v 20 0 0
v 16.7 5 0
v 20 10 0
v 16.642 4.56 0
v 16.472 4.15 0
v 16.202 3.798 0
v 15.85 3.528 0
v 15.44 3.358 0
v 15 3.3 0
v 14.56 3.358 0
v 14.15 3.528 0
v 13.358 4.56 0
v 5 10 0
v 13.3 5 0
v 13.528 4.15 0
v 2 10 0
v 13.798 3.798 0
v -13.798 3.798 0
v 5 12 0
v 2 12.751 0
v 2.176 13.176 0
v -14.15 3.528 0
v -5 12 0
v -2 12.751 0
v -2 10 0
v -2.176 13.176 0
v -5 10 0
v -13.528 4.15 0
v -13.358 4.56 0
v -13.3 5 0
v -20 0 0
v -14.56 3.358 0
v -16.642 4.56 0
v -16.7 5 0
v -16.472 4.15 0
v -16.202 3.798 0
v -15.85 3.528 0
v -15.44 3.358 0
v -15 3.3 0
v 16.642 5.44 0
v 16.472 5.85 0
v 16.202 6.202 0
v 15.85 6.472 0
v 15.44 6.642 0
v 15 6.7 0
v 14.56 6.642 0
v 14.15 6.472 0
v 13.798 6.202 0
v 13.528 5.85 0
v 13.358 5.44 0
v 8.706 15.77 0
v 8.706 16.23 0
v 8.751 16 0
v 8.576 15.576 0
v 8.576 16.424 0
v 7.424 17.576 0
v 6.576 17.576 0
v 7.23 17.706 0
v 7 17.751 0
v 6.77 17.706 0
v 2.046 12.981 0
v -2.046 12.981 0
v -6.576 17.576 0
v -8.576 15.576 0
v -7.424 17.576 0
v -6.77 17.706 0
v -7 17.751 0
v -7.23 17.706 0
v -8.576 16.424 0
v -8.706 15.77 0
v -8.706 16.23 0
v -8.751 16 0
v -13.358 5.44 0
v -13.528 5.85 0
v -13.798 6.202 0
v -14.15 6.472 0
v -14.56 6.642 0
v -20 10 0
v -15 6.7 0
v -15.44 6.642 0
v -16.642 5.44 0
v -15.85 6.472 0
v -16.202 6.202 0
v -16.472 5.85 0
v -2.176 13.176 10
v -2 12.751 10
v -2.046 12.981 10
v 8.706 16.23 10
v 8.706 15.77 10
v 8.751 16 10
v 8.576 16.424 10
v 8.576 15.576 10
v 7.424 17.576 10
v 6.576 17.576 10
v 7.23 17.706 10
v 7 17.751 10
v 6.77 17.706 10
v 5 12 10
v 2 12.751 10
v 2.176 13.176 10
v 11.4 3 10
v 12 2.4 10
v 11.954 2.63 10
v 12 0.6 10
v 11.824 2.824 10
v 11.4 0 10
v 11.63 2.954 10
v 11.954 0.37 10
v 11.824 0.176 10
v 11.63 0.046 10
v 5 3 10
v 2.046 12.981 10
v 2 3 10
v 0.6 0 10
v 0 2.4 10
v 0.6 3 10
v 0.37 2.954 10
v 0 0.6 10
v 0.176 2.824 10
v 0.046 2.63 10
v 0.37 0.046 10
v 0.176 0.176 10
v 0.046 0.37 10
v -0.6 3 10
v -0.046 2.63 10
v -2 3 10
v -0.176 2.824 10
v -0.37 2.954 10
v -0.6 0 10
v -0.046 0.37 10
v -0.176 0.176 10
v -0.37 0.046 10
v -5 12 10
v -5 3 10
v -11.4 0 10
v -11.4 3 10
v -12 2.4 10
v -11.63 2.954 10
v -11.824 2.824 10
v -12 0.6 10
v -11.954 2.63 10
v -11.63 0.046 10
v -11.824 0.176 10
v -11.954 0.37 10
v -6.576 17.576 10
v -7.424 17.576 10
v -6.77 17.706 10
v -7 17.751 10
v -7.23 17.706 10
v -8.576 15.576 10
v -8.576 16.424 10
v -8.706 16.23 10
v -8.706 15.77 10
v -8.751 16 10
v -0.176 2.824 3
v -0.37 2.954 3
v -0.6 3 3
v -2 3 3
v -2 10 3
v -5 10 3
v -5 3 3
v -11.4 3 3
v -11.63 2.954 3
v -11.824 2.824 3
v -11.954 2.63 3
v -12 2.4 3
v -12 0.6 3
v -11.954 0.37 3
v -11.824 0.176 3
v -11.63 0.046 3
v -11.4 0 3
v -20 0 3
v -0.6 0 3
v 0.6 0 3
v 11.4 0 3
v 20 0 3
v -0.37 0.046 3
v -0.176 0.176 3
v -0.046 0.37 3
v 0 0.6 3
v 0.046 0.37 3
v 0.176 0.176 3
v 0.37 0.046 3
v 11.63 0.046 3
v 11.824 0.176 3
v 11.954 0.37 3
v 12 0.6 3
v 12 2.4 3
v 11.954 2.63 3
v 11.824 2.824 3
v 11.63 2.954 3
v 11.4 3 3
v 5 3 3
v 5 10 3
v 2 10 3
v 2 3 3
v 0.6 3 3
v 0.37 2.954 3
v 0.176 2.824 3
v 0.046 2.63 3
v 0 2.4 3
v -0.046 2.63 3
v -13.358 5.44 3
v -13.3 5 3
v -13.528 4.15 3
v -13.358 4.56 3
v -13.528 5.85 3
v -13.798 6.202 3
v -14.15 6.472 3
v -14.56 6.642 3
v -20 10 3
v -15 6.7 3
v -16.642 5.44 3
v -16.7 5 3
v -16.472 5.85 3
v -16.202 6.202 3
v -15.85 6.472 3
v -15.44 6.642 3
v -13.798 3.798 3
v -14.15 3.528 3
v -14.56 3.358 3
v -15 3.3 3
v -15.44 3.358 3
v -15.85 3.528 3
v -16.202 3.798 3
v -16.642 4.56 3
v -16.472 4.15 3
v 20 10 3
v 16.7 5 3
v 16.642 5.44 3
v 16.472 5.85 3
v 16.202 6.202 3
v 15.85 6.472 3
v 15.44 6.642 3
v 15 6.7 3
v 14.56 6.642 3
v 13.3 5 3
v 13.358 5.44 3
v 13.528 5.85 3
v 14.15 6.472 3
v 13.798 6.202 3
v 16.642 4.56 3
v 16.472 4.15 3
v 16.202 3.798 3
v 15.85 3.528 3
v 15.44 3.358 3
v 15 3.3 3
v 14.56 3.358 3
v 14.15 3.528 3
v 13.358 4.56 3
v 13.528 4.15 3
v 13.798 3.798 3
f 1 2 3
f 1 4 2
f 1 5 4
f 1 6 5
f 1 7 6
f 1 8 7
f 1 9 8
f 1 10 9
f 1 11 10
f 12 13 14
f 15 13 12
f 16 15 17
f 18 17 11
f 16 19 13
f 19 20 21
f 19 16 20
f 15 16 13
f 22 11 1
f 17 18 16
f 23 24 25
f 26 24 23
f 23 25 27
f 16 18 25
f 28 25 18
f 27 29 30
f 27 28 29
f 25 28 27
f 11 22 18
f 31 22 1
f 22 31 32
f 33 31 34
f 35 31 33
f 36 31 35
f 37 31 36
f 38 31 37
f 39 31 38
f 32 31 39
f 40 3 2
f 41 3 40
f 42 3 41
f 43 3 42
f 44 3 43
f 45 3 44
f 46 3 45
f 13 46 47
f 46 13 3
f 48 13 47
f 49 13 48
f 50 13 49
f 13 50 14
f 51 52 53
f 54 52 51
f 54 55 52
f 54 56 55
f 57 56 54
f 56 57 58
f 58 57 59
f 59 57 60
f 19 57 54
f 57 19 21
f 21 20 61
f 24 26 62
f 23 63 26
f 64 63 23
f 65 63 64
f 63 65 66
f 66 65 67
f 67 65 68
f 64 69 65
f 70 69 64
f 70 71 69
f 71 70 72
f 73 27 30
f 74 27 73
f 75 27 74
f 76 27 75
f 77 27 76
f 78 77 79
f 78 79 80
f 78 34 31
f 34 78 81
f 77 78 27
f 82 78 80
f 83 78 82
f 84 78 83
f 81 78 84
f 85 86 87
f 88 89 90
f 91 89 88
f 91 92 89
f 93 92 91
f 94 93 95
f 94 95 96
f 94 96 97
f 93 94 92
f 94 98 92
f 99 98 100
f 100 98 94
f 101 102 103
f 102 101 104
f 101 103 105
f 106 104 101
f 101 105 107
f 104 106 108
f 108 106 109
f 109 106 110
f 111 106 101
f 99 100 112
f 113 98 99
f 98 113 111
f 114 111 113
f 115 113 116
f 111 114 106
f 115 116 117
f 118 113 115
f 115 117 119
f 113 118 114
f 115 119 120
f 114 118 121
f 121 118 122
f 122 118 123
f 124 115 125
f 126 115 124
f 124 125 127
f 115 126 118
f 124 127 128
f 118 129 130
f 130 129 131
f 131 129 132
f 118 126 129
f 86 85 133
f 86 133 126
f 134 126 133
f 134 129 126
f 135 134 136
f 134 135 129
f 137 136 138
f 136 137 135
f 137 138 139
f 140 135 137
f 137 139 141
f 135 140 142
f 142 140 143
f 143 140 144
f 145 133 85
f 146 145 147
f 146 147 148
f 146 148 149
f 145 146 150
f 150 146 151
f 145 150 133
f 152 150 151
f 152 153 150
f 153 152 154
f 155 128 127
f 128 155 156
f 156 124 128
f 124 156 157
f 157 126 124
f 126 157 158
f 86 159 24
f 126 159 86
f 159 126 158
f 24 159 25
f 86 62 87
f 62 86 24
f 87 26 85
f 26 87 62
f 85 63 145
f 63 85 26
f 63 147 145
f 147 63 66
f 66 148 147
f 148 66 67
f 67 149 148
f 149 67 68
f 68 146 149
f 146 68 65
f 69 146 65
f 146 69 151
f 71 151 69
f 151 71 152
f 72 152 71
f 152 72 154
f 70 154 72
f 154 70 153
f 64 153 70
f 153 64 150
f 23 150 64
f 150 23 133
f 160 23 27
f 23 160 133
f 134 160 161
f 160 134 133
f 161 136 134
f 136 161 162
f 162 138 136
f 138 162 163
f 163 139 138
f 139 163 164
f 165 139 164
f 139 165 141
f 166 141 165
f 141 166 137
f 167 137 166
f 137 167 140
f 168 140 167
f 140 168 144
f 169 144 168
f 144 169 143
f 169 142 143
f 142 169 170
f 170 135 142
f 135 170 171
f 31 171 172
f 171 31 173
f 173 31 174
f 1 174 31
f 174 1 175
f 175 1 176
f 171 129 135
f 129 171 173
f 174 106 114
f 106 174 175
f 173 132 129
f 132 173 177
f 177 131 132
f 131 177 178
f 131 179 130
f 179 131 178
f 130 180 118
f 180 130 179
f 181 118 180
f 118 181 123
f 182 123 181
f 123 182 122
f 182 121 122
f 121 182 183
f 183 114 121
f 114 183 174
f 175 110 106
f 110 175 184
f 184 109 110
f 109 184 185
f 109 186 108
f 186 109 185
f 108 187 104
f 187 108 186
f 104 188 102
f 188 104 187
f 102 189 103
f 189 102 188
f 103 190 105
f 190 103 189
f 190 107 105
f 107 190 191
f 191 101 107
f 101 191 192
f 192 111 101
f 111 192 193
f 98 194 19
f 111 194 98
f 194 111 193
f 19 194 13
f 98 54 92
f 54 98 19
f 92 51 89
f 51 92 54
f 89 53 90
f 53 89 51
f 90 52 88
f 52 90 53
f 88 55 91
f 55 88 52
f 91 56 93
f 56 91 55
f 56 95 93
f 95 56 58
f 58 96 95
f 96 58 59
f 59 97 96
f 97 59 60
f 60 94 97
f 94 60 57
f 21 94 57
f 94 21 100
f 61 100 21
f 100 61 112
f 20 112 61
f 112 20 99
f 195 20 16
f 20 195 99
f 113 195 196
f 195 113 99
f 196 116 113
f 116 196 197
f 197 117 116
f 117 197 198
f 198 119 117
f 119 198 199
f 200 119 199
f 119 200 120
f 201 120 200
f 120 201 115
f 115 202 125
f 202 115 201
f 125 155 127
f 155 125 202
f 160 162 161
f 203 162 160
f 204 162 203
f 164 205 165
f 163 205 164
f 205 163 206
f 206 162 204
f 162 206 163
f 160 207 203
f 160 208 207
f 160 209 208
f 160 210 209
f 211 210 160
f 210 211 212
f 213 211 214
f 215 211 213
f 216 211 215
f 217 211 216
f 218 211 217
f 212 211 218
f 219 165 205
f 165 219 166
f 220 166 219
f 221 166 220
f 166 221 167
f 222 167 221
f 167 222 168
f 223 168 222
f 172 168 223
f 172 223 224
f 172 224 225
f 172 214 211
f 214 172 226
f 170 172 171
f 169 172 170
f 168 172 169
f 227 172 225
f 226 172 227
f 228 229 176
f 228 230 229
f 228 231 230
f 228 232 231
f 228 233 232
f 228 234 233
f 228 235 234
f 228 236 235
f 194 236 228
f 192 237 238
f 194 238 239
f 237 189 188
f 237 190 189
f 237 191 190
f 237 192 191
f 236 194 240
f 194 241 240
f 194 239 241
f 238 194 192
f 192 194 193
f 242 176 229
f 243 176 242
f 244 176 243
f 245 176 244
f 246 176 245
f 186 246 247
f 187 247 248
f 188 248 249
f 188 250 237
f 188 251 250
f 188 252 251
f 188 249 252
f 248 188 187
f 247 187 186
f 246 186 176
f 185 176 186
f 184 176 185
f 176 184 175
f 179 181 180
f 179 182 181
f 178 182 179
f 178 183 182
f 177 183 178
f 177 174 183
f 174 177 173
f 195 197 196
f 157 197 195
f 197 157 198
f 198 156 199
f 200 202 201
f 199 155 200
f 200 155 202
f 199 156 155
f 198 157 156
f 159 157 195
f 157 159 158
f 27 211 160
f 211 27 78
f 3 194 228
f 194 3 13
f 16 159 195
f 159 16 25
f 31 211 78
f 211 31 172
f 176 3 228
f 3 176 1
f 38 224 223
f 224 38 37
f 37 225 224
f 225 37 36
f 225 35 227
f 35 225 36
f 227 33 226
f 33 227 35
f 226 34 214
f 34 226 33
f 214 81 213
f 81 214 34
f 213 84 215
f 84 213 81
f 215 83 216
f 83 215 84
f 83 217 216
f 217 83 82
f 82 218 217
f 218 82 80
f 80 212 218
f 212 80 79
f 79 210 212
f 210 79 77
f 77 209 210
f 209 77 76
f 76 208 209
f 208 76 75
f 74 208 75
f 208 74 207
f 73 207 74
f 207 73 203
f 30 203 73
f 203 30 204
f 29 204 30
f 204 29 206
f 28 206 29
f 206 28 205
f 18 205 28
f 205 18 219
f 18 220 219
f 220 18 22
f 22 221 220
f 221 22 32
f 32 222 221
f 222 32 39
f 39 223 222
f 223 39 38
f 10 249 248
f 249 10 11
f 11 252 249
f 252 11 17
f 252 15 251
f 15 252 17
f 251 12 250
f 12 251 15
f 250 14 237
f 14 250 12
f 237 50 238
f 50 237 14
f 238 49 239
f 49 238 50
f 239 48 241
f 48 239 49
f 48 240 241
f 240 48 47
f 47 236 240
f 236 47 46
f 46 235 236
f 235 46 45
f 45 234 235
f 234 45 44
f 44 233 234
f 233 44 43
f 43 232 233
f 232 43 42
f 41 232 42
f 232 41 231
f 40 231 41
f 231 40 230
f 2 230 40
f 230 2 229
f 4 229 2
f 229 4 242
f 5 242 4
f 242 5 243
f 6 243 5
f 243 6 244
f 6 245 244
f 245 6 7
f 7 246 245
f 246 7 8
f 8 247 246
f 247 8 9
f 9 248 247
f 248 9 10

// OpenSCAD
// Test model: mirrored cable clip with rounded profile, made from polygons and offsets in loops.
w = 10;
module half() {
  polygon([[0, 0], [12, 0], [12, 3], [5, 3], [5, 12], [9, 16], [7, 18], [2, 13], [2, 3], [0, 3]]);
}
linear_extrude(w) {
  offset(r = 0.6, $fn = 16) offset(delta = -0.6) half();
  mirror([1, 0]) offset(r = 0.6, $fn = 16) offset(delta = -0.6) half();
}
// screw tab
translate([-20, 0, 0]) linear_extrude(3) difference() {
  square([40, w]);
  for (x = [5, 35]) translate([x, w / 2]) circle(d = 3.4, $fn = 24);
}
